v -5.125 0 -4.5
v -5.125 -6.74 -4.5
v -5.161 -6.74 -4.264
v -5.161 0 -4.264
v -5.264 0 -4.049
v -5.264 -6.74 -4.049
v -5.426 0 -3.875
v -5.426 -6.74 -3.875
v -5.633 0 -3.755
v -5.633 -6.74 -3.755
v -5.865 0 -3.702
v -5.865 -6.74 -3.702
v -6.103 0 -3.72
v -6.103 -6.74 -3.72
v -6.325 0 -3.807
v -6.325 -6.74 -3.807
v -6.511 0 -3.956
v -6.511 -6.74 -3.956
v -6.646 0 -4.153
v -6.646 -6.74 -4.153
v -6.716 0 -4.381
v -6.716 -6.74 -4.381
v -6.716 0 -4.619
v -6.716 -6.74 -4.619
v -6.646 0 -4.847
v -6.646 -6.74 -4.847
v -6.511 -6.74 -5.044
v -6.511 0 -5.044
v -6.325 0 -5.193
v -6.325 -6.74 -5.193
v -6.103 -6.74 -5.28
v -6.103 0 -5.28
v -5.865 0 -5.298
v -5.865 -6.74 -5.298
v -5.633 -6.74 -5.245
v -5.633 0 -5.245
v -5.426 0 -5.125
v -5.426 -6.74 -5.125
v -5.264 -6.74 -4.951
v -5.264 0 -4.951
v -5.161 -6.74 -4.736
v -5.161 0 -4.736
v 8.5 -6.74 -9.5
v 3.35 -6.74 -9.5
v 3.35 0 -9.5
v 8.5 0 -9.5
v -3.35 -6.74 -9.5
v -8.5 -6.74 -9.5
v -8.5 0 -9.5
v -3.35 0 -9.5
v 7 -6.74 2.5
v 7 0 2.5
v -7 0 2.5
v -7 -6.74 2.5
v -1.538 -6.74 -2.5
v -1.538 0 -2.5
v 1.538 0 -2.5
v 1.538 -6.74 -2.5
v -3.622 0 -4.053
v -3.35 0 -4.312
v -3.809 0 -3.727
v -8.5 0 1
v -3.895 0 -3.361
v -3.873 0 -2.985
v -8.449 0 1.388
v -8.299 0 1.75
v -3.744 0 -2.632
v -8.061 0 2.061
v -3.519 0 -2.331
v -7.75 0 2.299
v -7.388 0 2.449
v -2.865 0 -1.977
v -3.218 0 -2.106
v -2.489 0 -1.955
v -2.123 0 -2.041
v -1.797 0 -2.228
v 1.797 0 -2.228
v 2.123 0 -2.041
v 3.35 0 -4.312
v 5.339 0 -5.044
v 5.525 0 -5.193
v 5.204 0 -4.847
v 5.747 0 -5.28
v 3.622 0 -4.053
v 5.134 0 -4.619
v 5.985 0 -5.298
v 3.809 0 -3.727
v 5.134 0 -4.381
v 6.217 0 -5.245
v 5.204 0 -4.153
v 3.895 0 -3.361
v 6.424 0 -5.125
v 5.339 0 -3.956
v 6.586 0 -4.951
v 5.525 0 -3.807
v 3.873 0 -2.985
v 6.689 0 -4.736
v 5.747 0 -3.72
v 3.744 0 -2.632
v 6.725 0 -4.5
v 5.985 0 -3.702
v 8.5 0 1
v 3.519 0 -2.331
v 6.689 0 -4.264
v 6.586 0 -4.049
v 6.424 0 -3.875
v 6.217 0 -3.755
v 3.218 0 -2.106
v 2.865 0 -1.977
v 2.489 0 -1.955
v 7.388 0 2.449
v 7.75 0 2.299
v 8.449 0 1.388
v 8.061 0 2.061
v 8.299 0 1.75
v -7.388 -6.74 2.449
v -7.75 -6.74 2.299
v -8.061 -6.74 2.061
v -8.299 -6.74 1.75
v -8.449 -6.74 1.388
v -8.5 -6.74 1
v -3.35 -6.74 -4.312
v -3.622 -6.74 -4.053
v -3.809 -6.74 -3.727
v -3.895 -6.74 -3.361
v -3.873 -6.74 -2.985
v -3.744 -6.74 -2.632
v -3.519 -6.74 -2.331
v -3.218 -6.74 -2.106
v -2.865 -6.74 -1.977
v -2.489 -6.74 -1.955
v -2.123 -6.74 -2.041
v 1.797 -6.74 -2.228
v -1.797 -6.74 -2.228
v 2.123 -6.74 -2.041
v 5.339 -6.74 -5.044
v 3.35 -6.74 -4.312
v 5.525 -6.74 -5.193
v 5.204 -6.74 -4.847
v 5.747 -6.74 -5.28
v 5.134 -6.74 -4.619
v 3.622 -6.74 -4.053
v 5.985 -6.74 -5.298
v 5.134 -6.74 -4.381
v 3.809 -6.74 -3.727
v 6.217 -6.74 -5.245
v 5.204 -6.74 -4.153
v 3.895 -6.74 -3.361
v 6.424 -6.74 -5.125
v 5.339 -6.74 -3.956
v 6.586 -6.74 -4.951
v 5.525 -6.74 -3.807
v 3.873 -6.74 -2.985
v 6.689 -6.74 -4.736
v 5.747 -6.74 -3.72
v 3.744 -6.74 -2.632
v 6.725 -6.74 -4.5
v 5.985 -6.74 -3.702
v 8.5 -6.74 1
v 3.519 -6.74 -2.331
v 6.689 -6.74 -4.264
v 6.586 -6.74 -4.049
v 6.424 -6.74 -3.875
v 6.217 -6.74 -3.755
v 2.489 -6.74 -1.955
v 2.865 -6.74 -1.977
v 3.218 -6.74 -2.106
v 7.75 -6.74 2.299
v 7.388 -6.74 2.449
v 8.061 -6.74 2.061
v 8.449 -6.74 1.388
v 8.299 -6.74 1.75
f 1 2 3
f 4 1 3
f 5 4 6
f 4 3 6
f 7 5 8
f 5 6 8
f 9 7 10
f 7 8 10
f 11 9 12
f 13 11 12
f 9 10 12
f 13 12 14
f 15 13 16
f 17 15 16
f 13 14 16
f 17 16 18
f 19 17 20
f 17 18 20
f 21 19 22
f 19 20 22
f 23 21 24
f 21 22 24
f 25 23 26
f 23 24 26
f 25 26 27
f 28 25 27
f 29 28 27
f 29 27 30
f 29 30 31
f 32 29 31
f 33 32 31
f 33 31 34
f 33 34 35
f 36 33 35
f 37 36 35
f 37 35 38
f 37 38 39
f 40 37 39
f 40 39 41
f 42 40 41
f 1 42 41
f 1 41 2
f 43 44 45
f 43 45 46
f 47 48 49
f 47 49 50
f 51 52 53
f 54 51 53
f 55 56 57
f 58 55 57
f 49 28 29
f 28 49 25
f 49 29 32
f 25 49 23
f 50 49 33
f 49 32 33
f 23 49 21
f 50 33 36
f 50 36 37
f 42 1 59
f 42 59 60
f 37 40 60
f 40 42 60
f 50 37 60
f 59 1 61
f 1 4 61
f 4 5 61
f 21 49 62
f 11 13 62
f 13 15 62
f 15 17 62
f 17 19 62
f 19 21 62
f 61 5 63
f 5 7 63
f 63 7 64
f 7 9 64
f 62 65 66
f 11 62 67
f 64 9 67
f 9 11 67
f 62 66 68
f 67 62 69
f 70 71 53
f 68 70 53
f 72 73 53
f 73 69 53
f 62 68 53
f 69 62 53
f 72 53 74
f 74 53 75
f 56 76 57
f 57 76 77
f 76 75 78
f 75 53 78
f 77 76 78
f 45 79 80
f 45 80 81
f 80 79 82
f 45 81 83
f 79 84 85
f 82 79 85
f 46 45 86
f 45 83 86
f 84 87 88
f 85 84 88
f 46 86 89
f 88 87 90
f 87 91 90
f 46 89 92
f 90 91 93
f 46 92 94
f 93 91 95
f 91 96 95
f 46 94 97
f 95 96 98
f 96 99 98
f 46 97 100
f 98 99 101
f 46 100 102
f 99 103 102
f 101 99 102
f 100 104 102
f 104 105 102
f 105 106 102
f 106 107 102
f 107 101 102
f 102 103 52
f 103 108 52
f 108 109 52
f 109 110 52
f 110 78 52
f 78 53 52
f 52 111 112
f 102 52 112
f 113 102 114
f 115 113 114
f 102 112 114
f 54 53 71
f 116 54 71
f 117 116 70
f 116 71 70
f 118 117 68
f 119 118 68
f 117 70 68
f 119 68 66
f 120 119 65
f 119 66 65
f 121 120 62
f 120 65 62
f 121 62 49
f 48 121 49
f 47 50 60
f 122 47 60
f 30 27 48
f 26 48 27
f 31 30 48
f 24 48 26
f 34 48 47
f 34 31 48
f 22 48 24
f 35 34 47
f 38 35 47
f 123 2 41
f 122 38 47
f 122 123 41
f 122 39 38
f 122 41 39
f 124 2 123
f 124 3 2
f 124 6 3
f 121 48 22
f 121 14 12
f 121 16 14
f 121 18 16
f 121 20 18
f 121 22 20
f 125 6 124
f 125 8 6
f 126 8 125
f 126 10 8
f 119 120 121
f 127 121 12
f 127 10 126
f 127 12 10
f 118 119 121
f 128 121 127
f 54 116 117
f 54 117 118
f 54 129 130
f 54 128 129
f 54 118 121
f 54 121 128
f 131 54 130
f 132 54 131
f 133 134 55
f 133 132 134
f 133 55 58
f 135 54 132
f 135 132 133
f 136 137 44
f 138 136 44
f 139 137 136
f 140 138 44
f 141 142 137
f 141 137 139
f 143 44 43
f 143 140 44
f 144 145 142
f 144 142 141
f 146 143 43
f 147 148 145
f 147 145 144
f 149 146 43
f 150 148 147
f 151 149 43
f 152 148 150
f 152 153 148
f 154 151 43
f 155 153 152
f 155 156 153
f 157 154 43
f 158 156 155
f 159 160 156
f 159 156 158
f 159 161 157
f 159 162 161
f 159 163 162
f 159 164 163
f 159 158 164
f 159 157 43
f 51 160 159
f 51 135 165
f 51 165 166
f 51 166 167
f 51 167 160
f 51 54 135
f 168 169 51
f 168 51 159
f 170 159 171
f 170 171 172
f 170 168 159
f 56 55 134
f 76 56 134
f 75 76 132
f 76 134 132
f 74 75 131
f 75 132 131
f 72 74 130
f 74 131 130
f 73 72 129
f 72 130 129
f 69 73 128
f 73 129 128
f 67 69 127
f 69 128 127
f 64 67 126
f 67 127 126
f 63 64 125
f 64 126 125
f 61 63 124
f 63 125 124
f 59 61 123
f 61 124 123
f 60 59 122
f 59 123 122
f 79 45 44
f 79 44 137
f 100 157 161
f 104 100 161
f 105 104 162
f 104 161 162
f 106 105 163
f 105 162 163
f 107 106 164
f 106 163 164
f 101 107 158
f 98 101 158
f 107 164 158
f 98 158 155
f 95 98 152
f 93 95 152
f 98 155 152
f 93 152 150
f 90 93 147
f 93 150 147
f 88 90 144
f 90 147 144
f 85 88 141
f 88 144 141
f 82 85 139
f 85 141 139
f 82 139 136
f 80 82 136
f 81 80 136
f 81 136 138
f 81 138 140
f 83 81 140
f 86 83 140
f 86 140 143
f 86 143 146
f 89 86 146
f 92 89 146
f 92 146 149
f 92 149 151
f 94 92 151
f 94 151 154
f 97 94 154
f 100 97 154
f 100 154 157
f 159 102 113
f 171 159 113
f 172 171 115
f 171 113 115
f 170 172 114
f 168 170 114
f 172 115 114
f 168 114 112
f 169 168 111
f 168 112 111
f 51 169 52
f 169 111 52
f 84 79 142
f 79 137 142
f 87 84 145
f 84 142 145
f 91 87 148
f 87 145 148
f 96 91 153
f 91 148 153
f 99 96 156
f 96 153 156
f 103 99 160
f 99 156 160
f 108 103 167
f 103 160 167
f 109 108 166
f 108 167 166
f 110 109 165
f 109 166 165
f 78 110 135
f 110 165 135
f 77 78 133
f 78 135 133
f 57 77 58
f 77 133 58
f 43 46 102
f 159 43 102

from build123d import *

# Parameters (mm, degrees)
F0_W     = 5.15
F0_H     = 7
F1_DEPTH = 6.74
F2_R     = 1.3
F3_DEPTH = 25
F4_R     = 0.8
F5_DEPTH = 6.741


with BuildPart() as f1:
    # F0 (on Front) → F1 (new body)
    with BuildSketch(Plane.XZ):
        with BuildLine():
            Line((7, 2.5), (-7, 2.5))
            ThreePointArc((-7, 2.5), (-8.06066, 2.06066), (-8.5, 1))
            Line((-8.5, 1), (-8.5, -2.5))
            Line((-8.5, -2.5), (-3.35, -2.5))
            Line((-3.35, -2.5), (3.35, -2.5))
            Line((3.35, -2.5), (8.5, -2.5))
            Line((8.5, -2.5), (8.5, 1))
            ThreePointArc((8.5, 1), (8.06066, 2.06066), (7, 2.5))
        make_face()
        with Locations((-5.925, -6)):
            Rectangle(F0_W, F0_H)
        with Locations((5.925, -6)):
            Rectangle(F0_W, F0_H)
    extrude(amount=F1_DEPTH)

    # F2 (on face) → F3 (cut)
    with BuildSketch(Plane.XZ.offset(6.74)):
        with Locations((-2.6, -3.25)):
            Circle(F2_R)
        with Locations((2.6, -3.25)):
            Circle(F2_R)
    extrude(amount=-F3_DEPTH, mode=Mode.SUBTRACT)

    # F4 (on face) → F5 (cut, through all)
    with BuildSketch(Plane.XZ.offset(6.74)):
        with Locations((-5.925, -4.5)):
            Circle(F4_R)
        with Locations((5.925, -4.5)):
            Circle(F4_R)
    extrude(amount=-F5_DEPTH, mode=Mode.SUBTRACT)


solid = f1.part
